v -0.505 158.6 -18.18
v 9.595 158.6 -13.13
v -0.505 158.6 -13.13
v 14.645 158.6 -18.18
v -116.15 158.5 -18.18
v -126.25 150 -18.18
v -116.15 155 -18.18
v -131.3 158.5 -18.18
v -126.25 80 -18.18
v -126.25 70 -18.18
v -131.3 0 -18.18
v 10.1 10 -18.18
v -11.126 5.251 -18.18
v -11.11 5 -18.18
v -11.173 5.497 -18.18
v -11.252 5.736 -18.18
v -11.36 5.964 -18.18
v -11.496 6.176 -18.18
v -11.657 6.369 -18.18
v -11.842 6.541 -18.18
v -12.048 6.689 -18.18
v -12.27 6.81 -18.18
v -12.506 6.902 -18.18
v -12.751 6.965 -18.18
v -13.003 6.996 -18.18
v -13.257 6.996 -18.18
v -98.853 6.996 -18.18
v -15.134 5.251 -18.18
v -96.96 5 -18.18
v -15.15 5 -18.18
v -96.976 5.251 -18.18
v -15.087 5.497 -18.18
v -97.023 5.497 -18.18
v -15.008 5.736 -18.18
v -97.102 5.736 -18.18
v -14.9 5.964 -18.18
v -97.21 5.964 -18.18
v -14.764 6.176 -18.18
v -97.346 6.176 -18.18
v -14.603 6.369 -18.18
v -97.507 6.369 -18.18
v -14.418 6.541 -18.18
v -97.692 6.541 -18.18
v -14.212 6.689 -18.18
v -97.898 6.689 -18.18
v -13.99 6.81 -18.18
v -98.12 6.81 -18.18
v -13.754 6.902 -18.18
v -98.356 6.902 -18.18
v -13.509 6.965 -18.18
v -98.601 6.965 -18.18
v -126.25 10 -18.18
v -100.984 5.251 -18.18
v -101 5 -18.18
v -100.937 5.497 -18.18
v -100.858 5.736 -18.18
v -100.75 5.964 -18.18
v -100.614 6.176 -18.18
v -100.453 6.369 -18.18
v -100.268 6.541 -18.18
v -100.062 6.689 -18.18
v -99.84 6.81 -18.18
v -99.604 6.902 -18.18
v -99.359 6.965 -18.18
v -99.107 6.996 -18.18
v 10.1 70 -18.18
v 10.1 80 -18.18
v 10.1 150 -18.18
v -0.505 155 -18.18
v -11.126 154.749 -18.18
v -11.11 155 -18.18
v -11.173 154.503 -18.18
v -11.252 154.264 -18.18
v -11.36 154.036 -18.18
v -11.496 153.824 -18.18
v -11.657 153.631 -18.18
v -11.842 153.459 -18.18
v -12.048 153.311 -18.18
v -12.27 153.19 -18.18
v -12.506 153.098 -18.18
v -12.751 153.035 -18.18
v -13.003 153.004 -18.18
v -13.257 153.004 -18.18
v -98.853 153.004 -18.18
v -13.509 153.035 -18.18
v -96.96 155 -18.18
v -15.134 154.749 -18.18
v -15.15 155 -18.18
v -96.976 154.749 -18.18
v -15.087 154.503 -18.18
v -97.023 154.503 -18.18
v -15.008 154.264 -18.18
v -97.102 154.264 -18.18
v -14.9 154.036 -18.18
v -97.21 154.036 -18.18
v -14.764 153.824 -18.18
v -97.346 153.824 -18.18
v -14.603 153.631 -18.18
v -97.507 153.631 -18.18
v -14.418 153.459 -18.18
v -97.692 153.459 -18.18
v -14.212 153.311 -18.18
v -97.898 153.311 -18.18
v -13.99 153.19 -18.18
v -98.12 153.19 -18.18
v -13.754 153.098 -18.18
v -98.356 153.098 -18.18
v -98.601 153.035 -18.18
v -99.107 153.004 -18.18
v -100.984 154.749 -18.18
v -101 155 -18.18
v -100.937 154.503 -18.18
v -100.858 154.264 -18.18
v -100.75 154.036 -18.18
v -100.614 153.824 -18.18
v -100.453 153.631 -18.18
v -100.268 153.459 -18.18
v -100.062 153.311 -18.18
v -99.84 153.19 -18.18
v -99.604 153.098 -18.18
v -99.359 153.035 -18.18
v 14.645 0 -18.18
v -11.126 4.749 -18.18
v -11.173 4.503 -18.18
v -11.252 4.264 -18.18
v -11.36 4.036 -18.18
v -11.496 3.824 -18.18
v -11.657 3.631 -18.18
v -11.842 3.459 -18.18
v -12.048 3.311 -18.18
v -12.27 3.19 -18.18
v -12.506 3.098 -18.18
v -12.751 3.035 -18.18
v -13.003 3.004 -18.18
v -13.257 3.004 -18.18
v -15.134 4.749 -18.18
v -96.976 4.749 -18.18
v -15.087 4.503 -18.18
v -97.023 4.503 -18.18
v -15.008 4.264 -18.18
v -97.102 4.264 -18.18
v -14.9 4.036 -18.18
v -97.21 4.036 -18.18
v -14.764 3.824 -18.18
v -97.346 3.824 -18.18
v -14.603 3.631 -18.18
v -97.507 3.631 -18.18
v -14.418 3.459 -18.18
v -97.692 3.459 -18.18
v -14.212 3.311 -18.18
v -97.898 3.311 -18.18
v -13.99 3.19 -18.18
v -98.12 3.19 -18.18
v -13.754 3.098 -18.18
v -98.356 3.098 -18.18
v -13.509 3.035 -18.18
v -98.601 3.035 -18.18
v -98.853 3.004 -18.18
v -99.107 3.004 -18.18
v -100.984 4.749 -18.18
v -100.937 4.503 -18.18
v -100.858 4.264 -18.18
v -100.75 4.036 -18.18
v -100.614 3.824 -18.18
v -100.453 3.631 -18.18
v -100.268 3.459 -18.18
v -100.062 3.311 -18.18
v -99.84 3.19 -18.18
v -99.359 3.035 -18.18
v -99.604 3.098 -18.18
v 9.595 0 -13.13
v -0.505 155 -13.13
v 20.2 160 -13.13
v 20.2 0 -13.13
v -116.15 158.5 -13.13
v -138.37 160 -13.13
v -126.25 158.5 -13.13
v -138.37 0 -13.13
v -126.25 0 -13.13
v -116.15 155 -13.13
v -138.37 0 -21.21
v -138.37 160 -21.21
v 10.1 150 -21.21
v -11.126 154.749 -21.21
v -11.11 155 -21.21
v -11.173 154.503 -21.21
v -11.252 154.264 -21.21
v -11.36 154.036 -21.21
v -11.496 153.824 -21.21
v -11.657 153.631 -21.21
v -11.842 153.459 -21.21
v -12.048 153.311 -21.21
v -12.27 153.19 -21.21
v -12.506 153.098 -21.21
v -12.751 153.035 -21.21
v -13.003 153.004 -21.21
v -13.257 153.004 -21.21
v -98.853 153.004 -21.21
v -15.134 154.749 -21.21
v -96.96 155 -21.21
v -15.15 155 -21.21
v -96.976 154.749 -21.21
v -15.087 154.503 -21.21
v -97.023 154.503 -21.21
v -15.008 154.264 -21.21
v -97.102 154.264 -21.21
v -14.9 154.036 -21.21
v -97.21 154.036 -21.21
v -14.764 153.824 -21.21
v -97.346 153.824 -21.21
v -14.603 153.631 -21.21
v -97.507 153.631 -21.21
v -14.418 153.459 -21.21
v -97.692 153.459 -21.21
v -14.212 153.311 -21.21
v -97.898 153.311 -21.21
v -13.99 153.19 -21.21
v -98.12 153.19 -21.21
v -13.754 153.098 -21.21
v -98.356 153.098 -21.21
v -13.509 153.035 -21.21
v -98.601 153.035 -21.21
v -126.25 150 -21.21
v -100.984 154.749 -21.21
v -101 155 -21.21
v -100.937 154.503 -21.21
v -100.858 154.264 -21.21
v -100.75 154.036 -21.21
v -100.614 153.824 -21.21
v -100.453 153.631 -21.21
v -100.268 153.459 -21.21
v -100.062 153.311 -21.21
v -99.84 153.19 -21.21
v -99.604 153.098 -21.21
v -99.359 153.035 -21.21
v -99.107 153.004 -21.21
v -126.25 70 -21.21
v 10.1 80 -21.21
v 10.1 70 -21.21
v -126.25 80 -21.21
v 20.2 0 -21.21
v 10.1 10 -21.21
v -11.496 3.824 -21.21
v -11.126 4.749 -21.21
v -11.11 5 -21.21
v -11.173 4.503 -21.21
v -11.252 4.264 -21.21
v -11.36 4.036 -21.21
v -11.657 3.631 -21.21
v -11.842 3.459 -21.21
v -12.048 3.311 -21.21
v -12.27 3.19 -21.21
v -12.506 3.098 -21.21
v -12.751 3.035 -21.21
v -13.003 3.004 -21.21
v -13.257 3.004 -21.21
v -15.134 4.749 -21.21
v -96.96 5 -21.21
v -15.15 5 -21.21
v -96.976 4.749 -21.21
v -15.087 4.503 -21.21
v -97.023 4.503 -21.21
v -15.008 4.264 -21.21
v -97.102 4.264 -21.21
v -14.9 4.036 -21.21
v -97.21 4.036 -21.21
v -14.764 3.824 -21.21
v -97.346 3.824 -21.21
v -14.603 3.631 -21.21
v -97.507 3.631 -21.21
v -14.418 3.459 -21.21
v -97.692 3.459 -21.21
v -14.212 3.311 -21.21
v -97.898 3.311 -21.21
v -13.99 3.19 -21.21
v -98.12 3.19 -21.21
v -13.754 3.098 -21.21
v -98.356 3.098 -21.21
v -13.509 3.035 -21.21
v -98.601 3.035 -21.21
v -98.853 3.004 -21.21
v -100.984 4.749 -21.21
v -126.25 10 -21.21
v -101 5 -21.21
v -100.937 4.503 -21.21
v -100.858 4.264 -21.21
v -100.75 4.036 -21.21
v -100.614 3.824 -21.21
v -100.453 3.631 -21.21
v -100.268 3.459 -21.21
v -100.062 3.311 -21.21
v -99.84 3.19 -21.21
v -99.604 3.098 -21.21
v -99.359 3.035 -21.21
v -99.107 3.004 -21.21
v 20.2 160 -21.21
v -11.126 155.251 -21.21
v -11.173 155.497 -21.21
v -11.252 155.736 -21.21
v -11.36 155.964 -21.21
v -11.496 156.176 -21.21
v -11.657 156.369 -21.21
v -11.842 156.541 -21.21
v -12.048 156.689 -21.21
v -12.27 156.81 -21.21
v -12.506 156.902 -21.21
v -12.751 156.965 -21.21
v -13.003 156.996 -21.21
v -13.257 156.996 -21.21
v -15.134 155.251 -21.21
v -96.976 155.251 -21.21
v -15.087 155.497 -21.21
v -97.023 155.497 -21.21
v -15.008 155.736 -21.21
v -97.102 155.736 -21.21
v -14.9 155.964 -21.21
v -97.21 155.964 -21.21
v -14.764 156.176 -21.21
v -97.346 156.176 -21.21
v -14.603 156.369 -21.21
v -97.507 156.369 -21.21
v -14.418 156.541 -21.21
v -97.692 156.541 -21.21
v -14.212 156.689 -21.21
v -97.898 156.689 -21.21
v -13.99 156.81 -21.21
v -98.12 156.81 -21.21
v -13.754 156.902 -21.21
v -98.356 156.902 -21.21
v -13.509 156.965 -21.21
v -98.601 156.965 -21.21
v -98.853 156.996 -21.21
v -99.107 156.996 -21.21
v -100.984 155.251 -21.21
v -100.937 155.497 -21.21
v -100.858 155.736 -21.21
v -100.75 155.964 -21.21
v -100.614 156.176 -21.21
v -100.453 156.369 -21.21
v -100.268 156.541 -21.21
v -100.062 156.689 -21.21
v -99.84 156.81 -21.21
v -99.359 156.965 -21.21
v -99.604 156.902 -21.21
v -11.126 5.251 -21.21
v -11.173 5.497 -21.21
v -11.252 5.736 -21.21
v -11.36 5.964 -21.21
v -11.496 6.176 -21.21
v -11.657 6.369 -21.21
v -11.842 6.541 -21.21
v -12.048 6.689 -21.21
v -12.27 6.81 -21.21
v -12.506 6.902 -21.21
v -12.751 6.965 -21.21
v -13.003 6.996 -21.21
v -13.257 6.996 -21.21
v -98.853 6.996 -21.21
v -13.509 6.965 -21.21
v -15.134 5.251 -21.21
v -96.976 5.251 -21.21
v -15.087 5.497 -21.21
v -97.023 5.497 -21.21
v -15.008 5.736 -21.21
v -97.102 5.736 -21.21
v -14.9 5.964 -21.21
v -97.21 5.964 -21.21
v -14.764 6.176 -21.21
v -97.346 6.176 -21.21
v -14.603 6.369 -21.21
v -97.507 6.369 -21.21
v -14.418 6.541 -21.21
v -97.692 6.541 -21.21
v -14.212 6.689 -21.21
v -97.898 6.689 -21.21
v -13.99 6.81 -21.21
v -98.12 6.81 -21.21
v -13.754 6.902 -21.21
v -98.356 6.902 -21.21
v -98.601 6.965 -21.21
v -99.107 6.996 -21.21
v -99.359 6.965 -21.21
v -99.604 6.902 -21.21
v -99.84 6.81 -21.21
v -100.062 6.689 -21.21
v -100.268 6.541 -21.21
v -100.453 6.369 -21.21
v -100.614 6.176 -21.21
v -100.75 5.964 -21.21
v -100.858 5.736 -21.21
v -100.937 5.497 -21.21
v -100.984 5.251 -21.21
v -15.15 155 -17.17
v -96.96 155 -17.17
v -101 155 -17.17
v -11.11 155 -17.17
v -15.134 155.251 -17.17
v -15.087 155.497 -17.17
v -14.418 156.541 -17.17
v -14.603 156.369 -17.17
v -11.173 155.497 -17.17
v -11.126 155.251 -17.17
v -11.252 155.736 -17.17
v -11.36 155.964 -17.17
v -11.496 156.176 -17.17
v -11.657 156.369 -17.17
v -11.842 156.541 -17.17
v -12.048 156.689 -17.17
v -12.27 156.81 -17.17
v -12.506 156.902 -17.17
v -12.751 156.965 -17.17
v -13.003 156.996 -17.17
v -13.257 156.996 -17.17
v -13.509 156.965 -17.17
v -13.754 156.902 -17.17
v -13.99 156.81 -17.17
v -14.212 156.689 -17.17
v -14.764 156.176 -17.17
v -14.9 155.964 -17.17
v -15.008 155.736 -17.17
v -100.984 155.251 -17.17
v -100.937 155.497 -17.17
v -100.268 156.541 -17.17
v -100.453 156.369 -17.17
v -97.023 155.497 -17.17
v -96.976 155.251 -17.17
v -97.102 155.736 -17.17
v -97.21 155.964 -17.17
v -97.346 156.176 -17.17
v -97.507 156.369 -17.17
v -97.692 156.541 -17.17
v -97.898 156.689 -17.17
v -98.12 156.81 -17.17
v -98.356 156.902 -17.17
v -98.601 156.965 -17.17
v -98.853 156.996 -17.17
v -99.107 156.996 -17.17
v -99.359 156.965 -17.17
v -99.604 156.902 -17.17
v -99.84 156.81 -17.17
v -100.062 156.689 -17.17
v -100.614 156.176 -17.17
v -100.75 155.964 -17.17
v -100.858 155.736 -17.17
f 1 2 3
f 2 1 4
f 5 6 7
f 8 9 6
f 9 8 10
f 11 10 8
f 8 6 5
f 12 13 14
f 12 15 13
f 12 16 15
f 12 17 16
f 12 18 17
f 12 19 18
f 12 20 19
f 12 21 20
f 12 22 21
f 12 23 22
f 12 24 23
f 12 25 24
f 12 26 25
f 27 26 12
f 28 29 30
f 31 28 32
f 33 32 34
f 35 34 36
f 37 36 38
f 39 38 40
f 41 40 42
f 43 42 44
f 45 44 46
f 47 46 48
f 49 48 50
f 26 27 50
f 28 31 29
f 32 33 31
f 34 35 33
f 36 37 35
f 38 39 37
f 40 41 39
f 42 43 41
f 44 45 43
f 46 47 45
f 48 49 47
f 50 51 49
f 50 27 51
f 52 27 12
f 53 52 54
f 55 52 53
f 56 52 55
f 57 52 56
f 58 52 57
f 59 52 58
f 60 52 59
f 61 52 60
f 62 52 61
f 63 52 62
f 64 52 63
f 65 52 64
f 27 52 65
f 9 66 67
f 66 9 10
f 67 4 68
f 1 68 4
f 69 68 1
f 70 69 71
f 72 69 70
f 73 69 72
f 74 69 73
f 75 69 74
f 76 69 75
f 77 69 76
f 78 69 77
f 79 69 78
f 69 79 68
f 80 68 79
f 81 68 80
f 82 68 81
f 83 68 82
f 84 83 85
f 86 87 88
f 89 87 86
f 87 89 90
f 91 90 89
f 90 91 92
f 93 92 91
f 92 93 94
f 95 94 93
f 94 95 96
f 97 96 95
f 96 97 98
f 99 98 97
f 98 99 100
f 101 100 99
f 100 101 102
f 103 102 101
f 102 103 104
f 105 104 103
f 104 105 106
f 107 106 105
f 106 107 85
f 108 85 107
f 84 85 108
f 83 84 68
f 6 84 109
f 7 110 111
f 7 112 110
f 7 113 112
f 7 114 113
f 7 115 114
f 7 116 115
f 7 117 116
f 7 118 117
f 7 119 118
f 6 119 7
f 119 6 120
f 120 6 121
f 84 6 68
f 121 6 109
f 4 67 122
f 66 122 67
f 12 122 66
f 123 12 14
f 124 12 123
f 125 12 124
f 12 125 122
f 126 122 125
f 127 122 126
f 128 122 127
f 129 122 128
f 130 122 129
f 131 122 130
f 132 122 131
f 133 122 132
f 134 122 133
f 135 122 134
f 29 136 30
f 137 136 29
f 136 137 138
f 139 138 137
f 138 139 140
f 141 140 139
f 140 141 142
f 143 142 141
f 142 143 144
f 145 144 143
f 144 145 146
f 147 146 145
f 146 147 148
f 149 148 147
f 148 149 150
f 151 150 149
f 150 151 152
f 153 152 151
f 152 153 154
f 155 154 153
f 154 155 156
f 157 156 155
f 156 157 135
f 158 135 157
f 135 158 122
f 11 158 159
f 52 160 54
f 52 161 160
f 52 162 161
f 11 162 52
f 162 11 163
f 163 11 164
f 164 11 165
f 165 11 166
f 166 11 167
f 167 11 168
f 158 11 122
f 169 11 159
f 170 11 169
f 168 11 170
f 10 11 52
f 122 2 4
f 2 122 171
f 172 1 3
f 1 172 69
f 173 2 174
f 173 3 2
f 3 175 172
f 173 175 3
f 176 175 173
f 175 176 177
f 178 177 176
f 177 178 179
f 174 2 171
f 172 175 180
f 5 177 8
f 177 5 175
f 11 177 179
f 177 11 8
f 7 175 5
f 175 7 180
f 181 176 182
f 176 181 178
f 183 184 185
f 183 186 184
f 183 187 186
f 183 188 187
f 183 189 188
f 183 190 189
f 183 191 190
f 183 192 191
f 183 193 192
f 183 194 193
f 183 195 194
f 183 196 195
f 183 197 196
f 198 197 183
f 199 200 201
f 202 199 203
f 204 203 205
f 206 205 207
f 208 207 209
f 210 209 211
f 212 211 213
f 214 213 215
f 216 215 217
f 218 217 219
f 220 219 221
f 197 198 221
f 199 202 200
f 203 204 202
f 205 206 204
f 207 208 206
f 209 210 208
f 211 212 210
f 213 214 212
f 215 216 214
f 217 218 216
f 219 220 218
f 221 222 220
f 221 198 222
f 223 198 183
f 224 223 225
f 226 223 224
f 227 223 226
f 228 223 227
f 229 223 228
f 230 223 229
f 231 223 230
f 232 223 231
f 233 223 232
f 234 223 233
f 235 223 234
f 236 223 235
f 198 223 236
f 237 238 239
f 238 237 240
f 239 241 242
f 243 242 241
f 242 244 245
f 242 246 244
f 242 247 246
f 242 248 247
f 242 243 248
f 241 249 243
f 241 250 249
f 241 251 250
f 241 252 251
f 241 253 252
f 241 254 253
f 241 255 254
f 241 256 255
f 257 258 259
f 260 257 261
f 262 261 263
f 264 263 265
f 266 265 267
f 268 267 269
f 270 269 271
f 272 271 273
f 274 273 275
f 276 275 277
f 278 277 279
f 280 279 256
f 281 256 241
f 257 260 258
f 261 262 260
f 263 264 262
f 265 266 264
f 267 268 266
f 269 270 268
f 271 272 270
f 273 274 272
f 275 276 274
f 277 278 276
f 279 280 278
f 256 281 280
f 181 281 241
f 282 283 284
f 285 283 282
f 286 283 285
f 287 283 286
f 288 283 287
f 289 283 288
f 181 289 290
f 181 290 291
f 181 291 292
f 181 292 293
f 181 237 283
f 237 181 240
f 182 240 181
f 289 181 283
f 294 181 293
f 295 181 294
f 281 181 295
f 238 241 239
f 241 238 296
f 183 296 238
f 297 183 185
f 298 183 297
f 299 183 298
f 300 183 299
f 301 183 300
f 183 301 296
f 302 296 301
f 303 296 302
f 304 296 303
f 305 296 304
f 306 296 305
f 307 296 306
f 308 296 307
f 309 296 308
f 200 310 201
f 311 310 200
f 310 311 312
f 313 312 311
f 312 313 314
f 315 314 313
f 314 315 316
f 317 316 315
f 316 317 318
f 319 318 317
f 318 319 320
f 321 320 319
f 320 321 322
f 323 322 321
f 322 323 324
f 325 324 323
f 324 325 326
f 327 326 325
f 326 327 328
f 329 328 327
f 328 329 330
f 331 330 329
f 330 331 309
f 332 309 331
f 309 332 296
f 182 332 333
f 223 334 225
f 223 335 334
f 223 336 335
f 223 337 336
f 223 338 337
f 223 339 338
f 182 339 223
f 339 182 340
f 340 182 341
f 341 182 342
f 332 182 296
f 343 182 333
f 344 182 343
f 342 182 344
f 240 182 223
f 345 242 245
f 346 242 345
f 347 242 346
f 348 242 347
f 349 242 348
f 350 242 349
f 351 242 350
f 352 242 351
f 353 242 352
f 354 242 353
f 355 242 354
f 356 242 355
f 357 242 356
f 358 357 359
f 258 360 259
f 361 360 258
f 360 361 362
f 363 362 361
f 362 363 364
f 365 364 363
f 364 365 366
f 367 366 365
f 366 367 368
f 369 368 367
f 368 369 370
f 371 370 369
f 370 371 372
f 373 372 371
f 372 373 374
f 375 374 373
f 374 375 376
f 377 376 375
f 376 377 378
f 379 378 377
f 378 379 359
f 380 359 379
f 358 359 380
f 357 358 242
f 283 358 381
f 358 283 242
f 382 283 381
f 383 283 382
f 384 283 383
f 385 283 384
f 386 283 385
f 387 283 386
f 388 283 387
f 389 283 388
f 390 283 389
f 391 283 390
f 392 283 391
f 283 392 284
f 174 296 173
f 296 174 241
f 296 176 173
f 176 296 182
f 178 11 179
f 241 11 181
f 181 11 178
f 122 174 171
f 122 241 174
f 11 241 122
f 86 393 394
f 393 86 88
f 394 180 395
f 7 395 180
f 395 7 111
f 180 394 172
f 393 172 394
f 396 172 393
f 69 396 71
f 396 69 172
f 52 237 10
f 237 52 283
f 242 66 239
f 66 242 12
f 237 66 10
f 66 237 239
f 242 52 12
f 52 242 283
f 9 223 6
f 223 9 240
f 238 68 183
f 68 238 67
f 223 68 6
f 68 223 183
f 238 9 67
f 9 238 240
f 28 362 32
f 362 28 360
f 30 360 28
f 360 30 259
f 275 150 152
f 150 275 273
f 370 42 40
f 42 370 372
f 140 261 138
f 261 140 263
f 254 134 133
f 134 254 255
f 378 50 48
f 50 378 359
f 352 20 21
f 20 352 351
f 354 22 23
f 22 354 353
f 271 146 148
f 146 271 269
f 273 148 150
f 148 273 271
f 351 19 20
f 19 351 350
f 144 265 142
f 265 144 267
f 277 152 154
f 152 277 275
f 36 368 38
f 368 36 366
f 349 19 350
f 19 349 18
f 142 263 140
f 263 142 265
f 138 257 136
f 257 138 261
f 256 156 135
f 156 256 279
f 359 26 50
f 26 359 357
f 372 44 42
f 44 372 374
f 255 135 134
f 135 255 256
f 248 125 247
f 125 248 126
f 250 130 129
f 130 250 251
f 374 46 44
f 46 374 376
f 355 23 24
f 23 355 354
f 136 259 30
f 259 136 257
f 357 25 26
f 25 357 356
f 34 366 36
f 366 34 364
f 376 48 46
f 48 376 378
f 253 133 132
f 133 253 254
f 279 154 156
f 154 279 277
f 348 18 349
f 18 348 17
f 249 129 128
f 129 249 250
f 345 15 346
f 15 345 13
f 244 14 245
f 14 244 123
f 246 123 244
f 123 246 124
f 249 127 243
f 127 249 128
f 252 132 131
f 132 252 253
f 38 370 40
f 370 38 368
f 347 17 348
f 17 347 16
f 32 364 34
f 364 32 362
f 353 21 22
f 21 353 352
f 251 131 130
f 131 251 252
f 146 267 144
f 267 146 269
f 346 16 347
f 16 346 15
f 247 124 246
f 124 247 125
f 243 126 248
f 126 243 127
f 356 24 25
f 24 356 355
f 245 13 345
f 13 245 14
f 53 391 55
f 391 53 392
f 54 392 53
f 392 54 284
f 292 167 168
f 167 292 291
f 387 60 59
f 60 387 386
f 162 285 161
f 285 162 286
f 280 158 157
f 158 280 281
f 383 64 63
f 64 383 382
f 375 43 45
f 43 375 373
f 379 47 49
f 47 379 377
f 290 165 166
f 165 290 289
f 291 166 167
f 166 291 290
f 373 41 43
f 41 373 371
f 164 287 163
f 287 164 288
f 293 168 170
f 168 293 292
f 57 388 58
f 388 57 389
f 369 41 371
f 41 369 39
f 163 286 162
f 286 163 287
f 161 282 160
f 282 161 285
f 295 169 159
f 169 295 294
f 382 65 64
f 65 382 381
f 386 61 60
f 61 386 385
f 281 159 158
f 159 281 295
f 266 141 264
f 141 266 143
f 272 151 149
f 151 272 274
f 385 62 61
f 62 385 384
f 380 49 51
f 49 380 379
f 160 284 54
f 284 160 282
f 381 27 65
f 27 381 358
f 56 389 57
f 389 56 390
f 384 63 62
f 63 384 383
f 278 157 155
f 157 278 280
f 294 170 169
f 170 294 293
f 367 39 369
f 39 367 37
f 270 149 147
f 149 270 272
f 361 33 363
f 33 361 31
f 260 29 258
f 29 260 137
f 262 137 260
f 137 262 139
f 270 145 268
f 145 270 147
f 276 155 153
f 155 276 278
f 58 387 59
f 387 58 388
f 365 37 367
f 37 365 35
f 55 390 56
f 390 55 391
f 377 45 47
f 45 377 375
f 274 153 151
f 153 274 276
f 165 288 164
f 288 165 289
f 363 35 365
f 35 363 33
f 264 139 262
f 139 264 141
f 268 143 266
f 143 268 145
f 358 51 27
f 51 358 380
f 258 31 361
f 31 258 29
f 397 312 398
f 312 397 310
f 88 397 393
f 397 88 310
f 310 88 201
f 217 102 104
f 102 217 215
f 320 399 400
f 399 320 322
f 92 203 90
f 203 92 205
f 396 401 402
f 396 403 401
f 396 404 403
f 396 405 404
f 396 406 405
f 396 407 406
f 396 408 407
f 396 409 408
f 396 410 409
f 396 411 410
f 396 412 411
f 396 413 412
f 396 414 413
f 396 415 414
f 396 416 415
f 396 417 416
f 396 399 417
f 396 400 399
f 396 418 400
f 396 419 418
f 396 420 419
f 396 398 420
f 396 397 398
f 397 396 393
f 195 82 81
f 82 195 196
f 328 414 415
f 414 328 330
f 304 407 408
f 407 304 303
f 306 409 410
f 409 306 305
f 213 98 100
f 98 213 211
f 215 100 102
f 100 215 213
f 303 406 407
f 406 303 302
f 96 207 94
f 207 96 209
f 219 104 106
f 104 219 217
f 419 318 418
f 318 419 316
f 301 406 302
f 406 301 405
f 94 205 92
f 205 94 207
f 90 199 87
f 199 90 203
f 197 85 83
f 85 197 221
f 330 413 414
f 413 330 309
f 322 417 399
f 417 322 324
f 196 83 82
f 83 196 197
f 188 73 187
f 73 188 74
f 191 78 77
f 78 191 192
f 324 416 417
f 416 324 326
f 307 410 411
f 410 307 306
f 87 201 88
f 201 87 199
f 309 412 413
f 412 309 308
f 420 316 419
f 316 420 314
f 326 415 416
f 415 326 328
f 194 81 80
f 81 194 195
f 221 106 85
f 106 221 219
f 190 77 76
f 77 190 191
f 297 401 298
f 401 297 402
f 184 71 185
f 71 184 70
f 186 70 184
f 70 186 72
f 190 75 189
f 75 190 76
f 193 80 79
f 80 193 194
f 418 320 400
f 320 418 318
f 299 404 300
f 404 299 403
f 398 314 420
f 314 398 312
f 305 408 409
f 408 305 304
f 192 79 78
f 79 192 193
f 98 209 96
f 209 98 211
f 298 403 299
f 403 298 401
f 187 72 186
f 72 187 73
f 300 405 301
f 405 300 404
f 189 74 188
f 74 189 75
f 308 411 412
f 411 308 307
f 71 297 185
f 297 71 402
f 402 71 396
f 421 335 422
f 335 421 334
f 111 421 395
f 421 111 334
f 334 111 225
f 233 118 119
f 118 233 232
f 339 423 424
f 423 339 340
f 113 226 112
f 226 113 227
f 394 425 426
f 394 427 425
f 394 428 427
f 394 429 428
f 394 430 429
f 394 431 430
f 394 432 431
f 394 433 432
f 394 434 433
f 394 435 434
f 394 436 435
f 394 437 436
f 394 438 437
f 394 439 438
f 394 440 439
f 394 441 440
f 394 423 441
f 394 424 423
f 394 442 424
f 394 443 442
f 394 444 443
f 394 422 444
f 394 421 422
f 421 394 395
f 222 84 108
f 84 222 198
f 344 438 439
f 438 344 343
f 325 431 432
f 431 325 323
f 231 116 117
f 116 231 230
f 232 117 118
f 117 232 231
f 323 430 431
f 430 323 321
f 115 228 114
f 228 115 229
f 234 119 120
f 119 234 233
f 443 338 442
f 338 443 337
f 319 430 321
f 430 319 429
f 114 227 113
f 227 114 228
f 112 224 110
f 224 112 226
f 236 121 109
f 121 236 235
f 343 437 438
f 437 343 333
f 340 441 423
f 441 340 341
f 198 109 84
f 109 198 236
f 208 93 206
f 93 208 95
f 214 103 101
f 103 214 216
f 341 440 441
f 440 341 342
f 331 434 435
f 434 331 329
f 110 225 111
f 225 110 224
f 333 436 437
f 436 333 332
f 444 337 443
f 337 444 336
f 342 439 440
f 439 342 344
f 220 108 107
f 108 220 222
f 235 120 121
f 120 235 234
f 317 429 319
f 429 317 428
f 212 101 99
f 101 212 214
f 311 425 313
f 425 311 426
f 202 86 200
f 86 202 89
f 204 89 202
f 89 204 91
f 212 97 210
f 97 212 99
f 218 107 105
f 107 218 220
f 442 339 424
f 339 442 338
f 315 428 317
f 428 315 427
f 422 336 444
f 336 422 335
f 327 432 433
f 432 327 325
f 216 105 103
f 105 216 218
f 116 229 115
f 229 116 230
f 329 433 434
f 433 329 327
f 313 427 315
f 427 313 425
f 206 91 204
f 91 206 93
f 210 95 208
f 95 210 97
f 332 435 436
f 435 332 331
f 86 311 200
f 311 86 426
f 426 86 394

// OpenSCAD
include <lib-raspberry.scad>

rotate ([0,180,0]) 
scale ([1.01,1,1.01]) {
  difference () {
    translate ([-20,0,13]) cube([157,160,8]);
    translate ([0,0,13]) cube([120,155,5]);
    translate ([-10,10,17]) cube([135,60,5]);
    translate ([-10,80,17]) cube([135,70,5]);
    hander_bottom ();
    translate ([13,5,17]) cylinder(10,2,2);
    translate ([98,5,17]) cylinder(10,2,2);
    translate ([13,155,17]) cylinder(10,2,2);
    translate ([98,155,17]) cylinder(10,2,2);
  }
}
